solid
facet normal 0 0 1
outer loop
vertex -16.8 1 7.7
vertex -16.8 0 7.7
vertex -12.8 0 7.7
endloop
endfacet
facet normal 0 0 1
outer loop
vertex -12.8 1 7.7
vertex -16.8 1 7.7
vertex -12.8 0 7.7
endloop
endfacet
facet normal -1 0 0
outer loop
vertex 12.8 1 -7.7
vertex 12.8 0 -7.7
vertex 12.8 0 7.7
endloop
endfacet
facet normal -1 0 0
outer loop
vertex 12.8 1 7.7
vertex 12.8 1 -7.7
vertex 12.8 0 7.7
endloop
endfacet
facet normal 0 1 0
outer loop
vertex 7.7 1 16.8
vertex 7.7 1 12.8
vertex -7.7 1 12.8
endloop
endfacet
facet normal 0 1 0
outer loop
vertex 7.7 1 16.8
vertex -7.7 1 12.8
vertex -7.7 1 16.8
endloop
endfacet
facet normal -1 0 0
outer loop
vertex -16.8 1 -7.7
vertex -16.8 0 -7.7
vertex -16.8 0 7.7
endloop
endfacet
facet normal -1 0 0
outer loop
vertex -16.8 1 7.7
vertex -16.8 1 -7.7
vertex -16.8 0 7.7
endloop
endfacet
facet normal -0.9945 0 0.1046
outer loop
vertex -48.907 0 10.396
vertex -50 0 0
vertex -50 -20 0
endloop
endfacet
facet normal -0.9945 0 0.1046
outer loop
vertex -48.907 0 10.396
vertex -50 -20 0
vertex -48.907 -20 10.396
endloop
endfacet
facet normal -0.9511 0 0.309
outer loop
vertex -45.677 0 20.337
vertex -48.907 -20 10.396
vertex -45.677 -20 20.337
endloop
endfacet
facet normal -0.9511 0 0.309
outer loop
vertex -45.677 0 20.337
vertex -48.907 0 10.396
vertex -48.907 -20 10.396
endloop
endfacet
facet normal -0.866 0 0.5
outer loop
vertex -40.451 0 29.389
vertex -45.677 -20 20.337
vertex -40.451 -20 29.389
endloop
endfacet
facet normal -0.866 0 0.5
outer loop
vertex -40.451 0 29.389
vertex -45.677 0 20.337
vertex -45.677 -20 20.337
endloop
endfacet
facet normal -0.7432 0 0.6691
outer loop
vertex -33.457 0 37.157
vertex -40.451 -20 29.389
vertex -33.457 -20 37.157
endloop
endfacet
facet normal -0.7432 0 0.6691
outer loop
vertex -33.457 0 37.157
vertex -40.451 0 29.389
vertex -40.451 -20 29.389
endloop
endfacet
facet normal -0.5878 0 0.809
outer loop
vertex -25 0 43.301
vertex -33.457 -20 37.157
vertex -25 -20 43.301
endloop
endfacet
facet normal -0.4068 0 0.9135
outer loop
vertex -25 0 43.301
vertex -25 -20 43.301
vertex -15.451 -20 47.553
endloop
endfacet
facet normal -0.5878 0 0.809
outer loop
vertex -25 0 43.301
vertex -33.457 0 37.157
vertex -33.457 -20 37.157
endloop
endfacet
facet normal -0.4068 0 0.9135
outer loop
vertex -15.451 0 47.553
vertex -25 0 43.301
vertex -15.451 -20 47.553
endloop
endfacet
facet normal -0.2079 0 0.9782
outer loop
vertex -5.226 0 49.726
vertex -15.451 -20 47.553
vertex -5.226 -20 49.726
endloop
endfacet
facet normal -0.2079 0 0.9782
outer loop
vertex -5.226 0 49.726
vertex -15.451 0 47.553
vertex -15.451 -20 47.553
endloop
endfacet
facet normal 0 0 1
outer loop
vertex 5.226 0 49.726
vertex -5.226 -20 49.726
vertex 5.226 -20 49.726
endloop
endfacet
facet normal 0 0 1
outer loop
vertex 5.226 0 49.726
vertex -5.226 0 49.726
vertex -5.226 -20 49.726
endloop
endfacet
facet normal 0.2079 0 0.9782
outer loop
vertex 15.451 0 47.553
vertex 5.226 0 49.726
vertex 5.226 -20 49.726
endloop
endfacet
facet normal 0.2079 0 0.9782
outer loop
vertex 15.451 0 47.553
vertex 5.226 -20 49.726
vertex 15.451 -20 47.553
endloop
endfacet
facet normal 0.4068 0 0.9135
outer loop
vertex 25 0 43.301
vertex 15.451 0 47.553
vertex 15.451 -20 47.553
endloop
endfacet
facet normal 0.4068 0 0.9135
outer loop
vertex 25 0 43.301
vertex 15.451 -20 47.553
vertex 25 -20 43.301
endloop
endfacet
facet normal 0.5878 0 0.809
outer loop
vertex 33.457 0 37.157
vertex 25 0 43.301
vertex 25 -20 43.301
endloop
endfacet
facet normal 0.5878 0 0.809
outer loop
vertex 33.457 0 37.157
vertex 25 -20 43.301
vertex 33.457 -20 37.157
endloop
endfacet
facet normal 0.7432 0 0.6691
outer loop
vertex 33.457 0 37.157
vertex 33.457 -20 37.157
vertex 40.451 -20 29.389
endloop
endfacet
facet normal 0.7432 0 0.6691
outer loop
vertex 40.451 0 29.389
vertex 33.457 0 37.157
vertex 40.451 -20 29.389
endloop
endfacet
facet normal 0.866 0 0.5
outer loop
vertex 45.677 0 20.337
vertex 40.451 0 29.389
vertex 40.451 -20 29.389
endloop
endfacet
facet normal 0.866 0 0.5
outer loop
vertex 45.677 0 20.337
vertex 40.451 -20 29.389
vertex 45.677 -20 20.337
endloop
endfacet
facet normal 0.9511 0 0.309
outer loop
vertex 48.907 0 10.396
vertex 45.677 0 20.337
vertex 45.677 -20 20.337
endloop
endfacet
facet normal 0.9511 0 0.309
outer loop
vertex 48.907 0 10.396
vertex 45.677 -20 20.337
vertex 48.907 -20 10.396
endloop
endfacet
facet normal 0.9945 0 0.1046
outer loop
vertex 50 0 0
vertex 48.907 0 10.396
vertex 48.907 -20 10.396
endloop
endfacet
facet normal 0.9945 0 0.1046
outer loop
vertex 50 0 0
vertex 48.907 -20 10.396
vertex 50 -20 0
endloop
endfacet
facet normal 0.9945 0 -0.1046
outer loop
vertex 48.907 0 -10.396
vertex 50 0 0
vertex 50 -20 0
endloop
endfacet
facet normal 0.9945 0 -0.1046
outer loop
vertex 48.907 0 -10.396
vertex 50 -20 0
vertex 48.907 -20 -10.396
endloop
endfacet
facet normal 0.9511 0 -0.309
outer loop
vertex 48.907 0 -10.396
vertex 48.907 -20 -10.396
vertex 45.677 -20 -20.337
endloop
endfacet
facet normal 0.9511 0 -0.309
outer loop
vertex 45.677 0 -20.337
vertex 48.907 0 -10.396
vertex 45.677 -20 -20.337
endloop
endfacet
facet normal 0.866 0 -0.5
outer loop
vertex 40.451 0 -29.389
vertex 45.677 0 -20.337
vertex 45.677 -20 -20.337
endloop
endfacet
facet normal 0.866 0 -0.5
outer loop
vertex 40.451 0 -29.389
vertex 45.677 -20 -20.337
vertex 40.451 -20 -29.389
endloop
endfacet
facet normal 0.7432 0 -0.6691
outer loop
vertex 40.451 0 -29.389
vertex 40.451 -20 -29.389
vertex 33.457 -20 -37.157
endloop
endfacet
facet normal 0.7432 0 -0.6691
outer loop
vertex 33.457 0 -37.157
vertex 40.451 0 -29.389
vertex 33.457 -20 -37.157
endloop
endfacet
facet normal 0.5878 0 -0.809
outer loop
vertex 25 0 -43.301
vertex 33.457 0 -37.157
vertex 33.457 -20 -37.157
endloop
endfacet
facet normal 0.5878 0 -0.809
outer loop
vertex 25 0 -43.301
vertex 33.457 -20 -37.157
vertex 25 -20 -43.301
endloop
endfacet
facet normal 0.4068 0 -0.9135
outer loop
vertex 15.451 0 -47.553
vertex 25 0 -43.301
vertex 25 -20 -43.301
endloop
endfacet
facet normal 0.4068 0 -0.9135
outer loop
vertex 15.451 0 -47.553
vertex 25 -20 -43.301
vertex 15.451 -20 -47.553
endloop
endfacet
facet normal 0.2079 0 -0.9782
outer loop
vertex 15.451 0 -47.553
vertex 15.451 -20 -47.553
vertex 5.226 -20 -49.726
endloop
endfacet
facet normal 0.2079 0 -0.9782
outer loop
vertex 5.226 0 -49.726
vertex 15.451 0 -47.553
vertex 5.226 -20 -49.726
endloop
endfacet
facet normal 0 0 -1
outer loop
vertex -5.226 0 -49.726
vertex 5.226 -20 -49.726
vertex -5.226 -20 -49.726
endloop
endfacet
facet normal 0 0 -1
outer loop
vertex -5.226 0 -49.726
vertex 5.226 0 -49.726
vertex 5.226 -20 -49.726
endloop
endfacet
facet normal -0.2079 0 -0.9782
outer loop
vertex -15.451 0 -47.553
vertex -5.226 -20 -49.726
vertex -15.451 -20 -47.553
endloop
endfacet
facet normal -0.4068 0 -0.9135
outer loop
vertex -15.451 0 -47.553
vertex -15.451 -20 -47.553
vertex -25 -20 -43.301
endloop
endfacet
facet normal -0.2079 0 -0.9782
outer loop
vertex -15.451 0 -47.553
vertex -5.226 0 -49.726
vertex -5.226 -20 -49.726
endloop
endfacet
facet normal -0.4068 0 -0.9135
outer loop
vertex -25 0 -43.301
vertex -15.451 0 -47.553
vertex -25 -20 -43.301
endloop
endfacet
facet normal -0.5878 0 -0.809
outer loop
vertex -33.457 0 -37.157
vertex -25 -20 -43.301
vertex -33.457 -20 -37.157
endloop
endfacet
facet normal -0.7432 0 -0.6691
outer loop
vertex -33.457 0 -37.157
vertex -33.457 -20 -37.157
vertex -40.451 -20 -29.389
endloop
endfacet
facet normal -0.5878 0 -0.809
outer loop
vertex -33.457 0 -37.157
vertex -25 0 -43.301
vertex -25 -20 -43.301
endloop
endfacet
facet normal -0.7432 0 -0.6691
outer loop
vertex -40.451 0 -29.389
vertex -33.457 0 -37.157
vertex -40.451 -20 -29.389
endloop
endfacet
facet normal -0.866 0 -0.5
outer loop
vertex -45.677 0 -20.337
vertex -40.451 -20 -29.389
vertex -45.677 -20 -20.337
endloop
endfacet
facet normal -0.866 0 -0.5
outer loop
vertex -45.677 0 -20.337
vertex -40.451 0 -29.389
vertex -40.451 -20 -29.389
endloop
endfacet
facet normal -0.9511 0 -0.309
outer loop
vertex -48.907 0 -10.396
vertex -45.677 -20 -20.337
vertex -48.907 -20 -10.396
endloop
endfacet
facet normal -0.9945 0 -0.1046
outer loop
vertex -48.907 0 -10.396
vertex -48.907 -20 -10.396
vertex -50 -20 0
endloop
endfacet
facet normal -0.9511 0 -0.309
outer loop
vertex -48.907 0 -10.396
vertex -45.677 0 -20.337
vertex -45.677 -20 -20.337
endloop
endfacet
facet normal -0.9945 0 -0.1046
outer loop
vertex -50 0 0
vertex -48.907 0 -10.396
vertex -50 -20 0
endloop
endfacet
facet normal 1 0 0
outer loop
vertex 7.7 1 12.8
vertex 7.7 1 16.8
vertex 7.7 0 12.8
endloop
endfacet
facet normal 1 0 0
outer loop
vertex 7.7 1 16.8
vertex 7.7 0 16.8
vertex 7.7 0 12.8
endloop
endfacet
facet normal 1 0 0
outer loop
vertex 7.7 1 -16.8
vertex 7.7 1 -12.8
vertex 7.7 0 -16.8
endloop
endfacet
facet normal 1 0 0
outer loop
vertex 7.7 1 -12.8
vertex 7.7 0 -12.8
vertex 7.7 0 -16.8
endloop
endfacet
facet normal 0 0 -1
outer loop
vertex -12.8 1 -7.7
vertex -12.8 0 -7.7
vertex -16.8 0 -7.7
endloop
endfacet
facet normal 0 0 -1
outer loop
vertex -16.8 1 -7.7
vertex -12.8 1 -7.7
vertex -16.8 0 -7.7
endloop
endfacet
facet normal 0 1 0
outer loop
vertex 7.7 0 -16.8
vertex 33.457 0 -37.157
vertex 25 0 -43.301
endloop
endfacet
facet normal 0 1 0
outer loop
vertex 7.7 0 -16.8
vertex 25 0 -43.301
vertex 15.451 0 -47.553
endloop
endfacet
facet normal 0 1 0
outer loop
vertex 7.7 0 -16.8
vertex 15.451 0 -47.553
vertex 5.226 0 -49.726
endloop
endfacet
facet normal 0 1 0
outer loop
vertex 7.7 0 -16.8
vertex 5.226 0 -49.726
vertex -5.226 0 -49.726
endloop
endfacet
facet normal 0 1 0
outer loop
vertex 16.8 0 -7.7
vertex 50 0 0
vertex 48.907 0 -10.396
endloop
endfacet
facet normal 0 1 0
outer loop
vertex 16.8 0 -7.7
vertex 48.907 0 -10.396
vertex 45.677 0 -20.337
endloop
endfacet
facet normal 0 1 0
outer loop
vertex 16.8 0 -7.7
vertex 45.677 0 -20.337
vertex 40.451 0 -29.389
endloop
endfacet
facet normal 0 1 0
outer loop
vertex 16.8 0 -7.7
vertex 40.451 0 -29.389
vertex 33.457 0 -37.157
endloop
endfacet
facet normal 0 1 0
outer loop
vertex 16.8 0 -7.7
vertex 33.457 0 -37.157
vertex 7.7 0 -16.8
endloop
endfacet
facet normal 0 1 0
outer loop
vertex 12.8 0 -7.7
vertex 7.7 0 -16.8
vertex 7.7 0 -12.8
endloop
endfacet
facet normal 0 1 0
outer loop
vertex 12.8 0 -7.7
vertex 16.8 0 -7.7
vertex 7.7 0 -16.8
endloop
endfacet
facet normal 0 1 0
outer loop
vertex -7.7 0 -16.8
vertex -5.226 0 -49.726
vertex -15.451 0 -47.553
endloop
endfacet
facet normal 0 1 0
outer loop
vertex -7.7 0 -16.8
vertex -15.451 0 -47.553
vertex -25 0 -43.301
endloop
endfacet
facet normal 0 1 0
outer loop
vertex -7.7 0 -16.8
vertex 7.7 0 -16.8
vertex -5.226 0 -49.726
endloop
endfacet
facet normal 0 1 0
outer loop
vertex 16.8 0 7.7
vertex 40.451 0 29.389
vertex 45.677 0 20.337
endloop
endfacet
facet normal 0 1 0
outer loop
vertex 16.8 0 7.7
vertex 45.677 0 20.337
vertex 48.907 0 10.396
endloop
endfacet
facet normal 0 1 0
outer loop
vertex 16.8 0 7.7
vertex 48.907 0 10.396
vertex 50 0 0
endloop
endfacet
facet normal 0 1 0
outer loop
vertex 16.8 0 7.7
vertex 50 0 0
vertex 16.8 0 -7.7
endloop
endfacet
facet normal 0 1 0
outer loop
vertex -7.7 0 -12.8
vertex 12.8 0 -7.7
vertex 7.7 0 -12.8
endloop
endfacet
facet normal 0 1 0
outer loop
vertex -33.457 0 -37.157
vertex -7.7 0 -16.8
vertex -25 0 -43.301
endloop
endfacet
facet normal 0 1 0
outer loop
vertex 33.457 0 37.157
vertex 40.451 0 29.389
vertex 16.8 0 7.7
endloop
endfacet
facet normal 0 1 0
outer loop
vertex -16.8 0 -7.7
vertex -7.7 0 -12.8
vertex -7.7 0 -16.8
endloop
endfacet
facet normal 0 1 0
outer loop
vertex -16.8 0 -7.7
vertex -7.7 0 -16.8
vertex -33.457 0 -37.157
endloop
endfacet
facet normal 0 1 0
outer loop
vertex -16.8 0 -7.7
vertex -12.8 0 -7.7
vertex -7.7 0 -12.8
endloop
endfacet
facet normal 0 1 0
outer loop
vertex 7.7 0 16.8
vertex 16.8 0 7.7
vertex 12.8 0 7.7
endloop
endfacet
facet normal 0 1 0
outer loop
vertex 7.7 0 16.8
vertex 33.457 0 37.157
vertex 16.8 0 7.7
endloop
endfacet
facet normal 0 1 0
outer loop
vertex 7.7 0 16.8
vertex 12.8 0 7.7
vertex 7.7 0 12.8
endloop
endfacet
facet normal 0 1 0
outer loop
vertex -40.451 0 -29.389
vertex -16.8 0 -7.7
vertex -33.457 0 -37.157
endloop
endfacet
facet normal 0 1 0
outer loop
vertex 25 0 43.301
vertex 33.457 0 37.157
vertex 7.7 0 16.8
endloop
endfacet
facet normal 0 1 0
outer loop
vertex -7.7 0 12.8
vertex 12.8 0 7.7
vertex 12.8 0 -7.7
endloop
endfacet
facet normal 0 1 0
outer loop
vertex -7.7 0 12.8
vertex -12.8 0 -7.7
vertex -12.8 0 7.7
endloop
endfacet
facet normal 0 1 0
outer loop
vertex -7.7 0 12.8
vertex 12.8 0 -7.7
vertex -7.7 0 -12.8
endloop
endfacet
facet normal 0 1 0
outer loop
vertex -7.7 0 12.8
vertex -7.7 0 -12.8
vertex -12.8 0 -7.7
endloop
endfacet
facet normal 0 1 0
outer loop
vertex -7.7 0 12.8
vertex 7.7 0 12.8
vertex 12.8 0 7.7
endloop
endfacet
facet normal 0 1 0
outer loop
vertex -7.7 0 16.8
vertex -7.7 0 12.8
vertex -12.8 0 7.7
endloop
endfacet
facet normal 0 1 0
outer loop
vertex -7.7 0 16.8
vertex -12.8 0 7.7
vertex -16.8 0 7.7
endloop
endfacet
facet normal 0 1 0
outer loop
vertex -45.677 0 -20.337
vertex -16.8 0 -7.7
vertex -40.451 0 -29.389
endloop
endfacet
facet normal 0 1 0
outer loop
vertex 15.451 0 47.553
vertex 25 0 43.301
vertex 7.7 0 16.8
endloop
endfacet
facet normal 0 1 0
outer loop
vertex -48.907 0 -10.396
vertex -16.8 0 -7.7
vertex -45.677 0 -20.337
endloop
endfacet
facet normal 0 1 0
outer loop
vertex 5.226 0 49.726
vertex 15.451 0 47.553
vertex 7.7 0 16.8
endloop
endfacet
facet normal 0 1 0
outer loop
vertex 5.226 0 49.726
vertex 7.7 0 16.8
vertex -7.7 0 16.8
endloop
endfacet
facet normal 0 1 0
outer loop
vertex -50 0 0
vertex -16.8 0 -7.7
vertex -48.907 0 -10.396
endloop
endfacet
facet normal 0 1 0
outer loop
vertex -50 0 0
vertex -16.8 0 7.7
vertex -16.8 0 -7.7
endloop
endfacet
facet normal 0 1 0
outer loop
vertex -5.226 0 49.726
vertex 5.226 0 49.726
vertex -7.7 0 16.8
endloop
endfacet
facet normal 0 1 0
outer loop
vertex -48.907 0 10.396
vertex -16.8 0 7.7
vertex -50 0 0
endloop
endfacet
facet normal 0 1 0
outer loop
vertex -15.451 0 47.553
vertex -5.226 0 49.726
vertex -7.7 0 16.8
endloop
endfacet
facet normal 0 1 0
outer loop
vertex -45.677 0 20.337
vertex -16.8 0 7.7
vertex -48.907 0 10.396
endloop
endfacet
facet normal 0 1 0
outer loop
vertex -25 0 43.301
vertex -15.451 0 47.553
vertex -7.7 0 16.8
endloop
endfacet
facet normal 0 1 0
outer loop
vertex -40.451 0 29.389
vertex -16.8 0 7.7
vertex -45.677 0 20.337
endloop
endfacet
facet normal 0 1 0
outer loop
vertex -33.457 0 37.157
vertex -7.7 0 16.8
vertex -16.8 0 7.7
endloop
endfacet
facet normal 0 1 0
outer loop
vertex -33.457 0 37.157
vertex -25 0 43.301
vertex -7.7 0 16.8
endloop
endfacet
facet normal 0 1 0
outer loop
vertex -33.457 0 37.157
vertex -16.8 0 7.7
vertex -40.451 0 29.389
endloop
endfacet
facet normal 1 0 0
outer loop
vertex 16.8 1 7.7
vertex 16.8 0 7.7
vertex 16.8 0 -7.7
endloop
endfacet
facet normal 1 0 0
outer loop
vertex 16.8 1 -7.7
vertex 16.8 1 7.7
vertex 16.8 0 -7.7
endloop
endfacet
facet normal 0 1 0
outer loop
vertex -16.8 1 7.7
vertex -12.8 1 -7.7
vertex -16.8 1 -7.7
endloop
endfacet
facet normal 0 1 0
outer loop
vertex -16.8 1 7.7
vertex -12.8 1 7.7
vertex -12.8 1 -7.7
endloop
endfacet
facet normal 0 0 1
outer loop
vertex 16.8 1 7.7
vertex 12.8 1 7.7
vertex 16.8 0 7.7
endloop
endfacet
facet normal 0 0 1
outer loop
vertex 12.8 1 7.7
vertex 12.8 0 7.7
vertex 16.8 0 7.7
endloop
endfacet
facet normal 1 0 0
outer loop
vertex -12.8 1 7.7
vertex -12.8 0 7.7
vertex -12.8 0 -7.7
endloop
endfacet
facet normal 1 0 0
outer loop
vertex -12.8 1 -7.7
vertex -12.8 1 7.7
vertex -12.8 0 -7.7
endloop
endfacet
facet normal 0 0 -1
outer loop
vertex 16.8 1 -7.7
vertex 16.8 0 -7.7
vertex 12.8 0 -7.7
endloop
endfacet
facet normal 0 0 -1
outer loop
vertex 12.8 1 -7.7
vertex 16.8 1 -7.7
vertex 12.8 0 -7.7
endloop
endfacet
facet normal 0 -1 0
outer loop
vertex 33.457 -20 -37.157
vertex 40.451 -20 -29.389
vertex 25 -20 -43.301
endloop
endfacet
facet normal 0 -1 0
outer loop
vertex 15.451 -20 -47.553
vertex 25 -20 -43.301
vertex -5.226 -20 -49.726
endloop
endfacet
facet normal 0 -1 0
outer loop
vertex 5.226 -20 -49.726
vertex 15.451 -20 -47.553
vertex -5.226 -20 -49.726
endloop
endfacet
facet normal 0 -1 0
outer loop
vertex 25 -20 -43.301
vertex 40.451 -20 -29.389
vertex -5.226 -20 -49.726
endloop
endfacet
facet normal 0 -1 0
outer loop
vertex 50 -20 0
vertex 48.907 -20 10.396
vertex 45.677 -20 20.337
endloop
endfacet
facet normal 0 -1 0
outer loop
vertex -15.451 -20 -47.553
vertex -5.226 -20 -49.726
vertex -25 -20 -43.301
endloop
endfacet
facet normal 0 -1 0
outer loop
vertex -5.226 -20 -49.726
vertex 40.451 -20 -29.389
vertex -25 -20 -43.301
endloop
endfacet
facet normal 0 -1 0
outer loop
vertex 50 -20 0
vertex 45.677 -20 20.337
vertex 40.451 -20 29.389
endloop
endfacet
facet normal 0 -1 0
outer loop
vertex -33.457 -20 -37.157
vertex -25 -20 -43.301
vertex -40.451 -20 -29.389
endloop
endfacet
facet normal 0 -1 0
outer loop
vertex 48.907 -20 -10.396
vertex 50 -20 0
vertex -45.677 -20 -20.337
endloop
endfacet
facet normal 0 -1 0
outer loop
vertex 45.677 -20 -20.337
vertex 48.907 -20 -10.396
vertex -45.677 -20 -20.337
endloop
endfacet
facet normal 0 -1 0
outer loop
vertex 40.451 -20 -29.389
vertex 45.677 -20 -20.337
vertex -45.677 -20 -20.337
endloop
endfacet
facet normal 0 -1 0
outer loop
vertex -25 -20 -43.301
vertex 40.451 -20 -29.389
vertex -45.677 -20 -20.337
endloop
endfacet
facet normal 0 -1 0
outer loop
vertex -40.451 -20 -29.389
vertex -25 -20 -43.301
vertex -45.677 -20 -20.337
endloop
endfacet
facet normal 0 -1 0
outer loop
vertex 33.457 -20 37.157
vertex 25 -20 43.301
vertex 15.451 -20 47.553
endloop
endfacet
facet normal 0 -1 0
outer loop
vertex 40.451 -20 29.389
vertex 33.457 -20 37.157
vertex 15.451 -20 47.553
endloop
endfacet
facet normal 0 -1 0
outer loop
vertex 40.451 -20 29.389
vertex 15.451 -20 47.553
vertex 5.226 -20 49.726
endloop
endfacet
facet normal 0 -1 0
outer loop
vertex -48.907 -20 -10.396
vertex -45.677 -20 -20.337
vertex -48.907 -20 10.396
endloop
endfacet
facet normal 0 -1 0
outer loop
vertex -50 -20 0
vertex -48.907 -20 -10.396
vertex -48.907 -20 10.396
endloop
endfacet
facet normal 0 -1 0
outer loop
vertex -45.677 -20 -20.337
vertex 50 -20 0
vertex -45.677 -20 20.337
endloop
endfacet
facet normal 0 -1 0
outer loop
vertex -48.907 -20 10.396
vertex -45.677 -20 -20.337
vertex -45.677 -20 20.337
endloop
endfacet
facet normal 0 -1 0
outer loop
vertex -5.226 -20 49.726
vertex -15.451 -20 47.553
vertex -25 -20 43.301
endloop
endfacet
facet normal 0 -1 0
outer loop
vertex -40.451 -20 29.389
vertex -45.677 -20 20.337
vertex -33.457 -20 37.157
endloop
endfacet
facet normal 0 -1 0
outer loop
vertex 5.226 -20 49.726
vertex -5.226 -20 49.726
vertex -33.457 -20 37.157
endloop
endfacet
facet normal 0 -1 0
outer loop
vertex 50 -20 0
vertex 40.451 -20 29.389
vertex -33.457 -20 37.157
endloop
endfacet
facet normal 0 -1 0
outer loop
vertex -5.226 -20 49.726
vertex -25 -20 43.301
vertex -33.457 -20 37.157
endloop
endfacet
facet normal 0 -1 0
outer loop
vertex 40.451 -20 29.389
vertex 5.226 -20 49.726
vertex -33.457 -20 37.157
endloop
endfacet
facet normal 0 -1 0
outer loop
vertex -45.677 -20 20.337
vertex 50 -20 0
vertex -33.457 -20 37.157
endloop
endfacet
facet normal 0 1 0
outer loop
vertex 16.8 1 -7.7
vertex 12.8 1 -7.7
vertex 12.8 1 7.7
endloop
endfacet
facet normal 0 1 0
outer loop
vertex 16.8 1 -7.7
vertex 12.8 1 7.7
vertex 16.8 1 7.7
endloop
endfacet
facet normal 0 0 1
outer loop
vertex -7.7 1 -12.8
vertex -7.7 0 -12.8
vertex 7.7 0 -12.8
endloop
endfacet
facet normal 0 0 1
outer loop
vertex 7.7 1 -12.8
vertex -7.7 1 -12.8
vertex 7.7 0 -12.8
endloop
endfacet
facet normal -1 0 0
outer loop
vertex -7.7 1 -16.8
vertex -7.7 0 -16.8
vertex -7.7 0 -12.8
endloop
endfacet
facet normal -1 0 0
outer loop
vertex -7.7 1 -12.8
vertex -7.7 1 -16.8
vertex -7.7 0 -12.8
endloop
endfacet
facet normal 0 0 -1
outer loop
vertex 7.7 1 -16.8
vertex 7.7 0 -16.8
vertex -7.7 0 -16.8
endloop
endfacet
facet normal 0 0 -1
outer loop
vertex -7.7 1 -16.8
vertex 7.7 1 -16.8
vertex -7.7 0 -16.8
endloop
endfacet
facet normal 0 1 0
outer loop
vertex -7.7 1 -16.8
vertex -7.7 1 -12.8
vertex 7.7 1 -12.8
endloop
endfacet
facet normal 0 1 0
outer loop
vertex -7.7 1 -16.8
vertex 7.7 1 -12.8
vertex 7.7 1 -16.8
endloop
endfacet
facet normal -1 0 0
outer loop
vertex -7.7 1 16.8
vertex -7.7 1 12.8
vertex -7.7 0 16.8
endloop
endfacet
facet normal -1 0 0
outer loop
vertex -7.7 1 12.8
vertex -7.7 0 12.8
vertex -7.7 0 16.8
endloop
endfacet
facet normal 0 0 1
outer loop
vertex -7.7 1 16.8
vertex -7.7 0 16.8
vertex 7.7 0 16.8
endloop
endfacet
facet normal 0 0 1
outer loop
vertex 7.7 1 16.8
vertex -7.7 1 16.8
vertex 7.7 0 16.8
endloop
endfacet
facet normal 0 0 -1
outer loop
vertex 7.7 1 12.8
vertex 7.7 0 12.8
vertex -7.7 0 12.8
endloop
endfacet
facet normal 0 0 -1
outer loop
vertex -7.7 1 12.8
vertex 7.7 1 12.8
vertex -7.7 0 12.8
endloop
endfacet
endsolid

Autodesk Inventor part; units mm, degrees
ref_plane "YZ Plane" through (0, 0, 0) normal (1, 0, 0) x (0, 1, 0)
ref_plane "XZ Plane" through (0, 0, 0) normal (0, 1, 0) x (-1, 0, 0)
ref_plane "XY Plane" through (0, 0, 0) normal (0, 0, 1) x (1, 0, 0)
sketch "Sketch1" plane through (0, 0, 0) normal (0, 1, 0) x (-1, 0, 0)
  line L0 (-12.7, 12.7) -> (12.7, 12.7)
  line L1 (12.7, 12.7) -> (12.7, -12.7)
  line L2 (12.7, -12.7) -> (-12.7, -12.7)
  line L3 (-12.7, -12.7) -> (-12.7, 12.7)
  line L4 (-12.7, 12.7) -> (12.7, -12.7) construction
  line L5 (12.7, 12.7) -> (-12.7, -12.7) construction
  circle A0 centre (0, 0) radius 50
  line L6 (12.8, -7.7) -> (16.8, -7.7)
  line L7 (16.8, -7.7) -> (16.8, 7.7)
  line L8 (16.8, 7.7) -> (12.8, 7.7)
  line L9 (12.8, 7.7) -> (12.8, -7.7)
  line L10 (-12.5, -17.7) -> (12.5, -17.7) construction
  line L11 (12.5, -17.7) -> (12.5, -42.7) construction
  line L12 (12.5, -42.7) -> (-12.5, -42.7) construction
  line L13 (-12.5, -42.7) -> (-12.5, -17.7) construction
  line L14 (0, -12.7) -> (0, -17.7) construction
  line L15 (17.8, 12.5) -> (42.8, 12.5) construction
  line L16 (42.8, 12.5) -> (42.8, -12.5) construction
  line L17 (42.8, -12.5) -> (17.8, -12.5) construction
  line L18 (17.8, -12.5) -> (17.8, 12.5) construction
  line L19 (-42.7, 12.5) -> (-17.7, 12.5) construction
  line L20 (-17.7, 12.5) -> (-17.7, -12.5) construction
  line L21 (-17.7, -12.5) -> (-42.7, -12.5) construction
  line L22 (-42.7, -12.5) -> (-42.7, 12.5) construction
  line L23 (-12.5, 42.7) -> (12.5, 42.7) construction
  line L24 (12.5, 42.7) -> (12.5, 17.7) construction
  line L25 (12.5, 17.7) -> (-12.5, 17.7) construction
  line L26 (-12.5, 17.7) -> (-12.5, 42.7) construction
  line L27 (17.8, 0) -> (12.8, 0) construction
  line L28 (-12.7, 0) -> (-17.7, 0) construction
  line L29 (0, 17.7) -> (0, 12.7) construction
  point P0 (30.3, 12.5)
  point P1 (-30.2, 12.5)
  point P2 (0, 42.7)
  dimension "d0" = 25.4
  dimension "d1" = 25.4
  dimension "d2" = 0.1
  dimension "d3" = 4
  dimension "d4" = 100
  dimension "d7" = 5
  dimension "d8" = 5
  dimension "d21" = 25
  dimension "d28" = 25
  dimension "d35" = 25
  dimension "d44" = 25
  dimension "d73" = 5
  dimension "d74" = 5
  dimension "d75" = 5
  dimension "d76" = 5
extrude "Extrusion1" add sketch "Sketch1" against normal blind 20 contours L0 L1 L2 L3 | A0 | L9 L8 L7 L6
extrude "Extrusion2" add sketch "Sketch1" along normal blind 1 contours L9 L8 L7 L6
pattern_circular "Circular Pattern1" count 4 over 360 about axis through (0, 0, 0) along (0, -1, 0) of "Extrusion2"
decal "Decal1"
decal "Decal2"
decal "Decal3"
decal "Decal4"
equation "\"d8\" = d7"
equation "\"d73\" = d74"
equation "\"d75\" = d74"
equation "\"d76\" = d74"
properties part number "Spin Chuck"
